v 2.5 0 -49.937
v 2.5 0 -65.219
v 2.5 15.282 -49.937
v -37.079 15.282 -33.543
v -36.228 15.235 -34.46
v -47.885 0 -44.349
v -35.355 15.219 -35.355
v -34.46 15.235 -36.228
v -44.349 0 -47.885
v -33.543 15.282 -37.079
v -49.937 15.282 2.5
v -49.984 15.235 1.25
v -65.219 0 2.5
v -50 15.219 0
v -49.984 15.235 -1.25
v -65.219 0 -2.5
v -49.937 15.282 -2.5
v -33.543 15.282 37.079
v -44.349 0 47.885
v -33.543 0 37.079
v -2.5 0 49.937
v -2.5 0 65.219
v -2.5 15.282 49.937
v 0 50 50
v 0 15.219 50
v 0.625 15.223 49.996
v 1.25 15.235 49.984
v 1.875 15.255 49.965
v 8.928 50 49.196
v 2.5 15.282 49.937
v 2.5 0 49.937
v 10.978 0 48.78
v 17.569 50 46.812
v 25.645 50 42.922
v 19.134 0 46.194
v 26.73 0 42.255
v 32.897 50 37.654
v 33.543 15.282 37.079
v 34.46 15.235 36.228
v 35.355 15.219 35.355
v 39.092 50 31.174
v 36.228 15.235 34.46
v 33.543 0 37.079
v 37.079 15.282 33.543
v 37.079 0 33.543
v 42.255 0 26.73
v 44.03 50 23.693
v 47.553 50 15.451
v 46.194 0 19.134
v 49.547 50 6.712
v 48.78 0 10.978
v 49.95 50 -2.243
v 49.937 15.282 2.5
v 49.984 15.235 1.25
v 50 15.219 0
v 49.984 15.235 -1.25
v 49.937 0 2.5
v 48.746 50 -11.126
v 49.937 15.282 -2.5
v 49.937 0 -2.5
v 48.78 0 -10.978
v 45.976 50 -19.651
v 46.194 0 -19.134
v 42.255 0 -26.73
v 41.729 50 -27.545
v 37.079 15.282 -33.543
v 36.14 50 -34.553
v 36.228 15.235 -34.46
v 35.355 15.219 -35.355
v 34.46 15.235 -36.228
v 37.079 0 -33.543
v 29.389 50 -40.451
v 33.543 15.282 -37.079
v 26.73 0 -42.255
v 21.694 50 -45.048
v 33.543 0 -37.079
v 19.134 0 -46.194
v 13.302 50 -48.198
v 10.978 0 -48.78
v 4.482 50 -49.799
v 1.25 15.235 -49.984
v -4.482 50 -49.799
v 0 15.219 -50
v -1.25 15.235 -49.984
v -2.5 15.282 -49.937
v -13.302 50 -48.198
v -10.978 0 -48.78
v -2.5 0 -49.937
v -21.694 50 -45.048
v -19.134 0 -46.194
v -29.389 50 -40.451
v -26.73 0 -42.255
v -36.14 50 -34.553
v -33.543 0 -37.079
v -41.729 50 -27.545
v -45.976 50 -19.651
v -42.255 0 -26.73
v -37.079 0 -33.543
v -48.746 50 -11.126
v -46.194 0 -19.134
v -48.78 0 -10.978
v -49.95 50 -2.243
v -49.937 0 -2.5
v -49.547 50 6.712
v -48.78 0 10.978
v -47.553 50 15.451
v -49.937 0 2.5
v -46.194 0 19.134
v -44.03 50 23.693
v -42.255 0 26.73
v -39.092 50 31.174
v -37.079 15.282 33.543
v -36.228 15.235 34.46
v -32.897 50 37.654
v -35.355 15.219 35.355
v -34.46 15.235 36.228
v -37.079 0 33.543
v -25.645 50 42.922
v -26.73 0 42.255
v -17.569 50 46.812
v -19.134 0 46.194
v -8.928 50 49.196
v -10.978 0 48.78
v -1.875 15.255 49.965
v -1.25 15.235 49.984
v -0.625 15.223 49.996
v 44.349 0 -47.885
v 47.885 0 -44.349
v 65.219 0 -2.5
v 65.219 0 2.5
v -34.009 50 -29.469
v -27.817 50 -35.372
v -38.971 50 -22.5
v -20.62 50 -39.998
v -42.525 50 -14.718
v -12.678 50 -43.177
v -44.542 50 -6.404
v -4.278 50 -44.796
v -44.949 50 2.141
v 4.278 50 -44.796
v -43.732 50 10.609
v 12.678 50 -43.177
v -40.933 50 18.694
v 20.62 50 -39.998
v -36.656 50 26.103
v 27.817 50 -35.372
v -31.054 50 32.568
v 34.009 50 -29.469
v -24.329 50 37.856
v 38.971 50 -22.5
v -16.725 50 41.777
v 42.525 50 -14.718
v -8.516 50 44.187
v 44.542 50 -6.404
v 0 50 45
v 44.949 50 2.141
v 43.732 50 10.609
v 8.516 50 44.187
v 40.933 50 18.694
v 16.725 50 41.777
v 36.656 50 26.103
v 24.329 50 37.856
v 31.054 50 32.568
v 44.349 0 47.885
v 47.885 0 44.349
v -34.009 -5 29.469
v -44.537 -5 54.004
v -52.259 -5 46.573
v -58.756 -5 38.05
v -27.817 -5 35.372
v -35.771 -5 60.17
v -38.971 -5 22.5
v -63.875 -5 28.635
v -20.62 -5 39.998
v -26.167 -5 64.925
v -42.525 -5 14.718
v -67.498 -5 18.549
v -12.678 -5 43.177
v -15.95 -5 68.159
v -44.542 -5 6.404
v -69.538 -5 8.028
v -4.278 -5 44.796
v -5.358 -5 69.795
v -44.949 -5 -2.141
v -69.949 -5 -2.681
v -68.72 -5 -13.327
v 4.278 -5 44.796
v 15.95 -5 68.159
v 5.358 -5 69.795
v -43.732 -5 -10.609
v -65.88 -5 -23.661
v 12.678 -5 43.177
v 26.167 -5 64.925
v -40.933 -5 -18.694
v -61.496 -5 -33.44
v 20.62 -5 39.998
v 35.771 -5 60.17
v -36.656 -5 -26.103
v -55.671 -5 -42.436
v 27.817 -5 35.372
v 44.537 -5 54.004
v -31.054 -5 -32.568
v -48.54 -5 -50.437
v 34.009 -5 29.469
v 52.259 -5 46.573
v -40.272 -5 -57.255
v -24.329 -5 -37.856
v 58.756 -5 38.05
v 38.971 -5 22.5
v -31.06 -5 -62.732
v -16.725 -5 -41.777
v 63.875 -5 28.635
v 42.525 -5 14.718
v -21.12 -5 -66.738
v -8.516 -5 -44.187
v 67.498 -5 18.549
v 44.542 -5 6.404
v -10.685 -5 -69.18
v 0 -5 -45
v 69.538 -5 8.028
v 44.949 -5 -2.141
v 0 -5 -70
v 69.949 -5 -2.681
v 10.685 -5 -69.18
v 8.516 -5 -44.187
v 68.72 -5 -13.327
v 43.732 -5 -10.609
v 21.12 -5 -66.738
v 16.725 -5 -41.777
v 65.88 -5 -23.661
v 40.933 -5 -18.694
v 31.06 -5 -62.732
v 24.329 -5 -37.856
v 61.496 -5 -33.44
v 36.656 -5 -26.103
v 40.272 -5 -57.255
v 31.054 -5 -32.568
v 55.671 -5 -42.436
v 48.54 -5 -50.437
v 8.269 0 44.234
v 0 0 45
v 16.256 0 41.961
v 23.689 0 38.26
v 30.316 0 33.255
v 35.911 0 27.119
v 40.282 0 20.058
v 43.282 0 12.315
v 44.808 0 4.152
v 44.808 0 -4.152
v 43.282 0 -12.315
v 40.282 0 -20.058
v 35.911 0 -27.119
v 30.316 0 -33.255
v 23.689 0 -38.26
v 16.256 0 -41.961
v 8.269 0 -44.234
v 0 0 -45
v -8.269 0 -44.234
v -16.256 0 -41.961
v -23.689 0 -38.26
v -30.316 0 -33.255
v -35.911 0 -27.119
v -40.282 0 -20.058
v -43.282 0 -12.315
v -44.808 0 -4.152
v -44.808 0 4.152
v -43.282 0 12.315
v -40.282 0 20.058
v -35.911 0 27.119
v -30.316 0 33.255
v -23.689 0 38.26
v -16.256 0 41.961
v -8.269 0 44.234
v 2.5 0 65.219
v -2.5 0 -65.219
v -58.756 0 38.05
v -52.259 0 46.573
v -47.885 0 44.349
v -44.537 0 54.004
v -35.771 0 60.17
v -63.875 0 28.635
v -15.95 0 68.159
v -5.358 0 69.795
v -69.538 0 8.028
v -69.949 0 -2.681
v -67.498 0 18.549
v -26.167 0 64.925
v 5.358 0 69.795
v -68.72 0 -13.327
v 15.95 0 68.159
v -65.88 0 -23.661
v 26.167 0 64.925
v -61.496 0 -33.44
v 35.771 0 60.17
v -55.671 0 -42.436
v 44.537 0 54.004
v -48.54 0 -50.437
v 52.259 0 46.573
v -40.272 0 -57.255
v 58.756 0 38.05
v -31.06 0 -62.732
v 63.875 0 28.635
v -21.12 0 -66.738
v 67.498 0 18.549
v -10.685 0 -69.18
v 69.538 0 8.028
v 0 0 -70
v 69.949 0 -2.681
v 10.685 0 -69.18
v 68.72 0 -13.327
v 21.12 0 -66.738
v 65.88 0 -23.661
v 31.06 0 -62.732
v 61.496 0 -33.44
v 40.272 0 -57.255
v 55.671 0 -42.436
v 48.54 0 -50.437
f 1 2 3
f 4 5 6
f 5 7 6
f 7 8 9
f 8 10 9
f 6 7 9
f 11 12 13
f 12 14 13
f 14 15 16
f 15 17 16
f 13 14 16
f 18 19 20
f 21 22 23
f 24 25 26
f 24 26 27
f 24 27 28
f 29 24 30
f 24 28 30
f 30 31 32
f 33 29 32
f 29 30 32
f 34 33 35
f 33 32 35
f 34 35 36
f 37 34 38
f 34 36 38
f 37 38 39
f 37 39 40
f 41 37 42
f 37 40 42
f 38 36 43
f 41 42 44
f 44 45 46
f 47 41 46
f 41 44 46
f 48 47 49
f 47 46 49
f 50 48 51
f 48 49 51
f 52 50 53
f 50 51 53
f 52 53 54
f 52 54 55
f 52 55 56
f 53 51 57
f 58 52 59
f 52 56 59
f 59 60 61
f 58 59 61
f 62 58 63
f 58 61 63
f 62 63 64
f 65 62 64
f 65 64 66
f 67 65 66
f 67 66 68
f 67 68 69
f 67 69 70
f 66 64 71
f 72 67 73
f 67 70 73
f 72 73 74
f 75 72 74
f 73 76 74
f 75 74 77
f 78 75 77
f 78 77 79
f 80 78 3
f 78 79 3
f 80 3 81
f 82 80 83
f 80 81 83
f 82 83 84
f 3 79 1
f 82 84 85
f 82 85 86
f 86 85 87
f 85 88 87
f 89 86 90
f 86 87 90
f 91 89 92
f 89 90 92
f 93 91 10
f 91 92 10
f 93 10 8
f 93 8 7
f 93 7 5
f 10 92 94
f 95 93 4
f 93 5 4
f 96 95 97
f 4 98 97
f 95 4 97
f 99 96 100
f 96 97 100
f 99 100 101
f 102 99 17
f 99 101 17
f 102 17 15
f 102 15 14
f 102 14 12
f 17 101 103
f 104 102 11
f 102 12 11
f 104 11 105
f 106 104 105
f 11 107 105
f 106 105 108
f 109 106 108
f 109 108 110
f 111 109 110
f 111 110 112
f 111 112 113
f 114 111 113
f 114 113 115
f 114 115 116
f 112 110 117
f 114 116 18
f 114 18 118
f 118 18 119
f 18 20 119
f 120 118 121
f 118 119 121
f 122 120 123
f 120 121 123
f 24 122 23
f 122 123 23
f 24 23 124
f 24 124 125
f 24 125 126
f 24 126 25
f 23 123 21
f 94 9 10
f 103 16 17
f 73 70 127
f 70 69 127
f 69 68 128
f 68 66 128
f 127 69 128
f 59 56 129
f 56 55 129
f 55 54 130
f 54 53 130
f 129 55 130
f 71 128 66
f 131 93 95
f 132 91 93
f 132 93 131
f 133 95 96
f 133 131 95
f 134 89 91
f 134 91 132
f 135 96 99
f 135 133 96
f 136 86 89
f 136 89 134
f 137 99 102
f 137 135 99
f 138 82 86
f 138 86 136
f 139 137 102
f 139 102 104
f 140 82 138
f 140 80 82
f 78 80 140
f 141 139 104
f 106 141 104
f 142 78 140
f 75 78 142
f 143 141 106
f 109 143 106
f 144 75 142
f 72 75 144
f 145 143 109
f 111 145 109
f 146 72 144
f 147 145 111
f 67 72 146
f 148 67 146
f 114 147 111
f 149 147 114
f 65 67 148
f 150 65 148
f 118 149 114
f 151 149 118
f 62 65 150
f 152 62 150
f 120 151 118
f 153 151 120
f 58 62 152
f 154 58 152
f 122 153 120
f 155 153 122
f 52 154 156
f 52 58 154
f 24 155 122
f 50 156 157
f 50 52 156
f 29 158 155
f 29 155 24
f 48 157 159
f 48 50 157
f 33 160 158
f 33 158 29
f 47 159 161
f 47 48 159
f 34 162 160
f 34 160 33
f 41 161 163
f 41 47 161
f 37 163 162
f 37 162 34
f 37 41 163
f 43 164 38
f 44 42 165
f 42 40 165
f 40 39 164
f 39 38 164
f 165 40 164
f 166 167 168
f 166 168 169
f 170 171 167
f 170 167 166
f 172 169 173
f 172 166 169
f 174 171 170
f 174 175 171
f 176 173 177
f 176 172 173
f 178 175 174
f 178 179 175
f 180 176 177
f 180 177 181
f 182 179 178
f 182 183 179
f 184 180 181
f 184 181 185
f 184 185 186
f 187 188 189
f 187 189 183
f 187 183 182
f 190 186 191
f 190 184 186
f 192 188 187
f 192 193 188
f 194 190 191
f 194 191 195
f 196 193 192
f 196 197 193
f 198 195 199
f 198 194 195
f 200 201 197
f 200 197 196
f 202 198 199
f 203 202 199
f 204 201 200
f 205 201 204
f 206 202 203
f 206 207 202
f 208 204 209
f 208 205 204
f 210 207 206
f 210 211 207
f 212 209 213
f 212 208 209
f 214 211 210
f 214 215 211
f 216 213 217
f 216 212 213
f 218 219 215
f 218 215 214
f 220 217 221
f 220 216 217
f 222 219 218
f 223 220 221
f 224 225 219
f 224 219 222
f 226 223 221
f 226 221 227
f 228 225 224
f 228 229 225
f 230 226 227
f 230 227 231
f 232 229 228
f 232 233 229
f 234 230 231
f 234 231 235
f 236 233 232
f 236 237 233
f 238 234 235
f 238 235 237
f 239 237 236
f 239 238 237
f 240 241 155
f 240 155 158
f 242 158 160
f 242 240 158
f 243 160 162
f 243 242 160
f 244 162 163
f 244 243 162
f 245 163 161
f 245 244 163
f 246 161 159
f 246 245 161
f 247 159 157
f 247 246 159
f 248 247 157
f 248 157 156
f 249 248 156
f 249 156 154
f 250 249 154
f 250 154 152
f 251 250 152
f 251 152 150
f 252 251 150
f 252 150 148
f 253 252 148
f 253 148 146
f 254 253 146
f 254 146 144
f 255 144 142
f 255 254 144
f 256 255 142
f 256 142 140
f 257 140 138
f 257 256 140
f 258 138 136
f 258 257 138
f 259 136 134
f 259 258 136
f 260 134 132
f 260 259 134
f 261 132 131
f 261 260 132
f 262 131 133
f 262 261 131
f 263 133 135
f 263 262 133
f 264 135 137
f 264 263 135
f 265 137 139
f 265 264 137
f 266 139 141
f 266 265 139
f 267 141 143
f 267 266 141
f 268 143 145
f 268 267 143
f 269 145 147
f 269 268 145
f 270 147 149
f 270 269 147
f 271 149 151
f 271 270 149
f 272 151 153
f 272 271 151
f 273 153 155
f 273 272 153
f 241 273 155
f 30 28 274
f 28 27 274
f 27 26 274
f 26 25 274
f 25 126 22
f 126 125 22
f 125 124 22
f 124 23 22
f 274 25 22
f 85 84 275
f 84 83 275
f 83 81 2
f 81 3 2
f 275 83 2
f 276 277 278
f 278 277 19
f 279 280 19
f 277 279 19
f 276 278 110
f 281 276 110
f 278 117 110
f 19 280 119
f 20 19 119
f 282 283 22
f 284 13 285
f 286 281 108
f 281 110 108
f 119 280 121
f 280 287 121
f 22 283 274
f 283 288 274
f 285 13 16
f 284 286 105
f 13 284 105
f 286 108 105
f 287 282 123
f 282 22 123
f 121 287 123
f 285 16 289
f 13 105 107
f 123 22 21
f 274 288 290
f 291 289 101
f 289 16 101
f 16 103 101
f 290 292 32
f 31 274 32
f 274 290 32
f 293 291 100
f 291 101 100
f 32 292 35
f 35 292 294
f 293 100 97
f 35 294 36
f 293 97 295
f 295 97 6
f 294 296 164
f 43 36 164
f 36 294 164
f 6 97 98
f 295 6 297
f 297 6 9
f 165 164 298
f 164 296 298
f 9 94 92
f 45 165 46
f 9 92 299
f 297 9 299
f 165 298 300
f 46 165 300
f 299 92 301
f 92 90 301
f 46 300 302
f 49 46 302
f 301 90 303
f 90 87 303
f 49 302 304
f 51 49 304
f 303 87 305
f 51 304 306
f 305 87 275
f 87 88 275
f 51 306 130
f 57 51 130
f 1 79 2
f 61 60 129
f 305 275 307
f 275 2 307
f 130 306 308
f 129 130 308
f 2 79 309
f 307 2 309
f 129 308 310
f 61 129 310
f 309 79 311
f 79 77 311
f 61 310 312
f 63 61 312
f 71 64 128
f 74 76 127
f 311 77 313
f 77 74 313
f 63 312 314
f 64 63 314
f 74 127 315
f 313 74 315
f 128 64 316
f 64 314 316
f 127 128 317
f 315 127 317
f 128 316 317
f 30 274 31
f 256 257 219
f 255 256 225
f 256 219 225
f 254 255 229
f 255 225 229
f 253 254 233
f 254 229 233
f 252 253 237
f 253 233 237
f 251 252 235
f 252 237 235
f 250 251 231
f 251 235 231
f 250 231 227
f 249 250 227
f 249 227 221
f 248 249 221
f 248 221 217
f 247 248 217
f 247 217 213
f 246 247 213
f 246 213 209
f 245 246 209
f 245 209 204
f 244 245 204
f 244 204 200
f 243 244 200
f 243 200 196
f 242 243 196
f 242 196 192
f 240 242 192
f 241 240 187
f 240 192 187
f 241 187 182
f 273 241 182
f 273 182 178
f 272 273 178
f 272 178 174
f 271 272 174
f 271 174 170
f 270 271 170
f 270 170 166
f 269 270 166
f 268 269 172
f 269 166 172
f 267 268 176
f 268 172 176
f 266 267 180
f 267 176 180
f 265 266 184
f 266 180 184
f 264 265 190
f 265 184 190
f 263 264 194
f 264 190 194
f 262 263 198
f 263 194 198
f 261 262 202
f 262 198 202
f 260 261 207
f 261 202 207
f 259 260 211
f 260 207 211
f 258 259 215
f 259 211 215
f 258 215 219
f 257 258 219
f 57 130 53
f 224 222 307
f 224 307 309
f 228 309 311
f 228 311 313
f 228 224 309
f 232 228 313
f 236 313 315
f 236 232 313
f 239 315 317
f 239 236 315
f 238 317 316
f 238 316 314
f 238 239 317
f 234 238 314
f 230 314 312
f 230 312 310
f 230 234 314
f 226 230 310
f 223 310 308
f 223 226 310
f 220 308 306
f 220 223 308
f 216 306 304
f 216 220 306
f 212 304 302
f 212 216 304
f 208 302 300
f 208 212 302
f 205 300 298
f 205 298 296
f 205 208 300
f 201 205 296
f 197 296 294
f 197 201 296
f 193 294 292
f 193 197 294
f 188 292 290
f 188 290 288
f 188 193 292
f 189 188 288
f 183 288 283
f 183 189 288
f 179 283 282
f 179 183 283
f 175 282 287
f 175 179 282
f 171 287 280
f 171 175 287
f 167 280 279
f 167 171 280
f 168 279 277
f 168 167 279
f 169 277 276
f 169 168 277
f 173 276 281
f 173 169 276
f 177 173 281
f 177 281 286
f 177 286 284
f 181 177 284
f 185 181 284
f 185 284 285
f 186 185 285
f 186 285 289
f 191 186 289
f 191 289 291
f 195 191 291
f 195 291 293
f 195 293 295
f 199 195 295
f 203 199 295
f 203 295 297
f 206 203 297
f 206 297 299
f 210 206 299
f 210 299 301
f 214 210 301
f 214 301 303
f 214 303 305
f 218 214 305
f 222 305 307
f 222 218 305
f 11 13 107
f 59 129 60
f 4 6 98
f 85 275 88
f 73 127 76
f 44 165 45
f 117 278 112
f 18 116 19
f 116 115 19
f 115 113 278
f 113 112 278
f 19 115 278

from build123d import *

# Parameters (mm, degrees)
SKETCH1_R           = 50
SKETCH1_R_2         = 45
BOSS_EXTRUDE1_DEPTH = 50
BOSS_EXTRUDE2_START = 5
SKETCH2_R           = 70
SKETCH2_R_2         = 45
BOSS_EXTRUDE2_DEPTH = 5
RIB1_REACH          = 112.905
SKETCH3_WALL_W      = 239.437922236
SKETCH3_WALL_H      = 5
CIRPATTERN1_COUNT   = 8


with BuildPart() as part:
    # Sketch1 → Boss-Extrude1 (new body)
    with BuildSketch(Plane(origin=(0, 0, 0), x_dir=(1, 0, 0), z_dir=(0, 1, 0))):
        Circle(SKETCH1_R)
        Circle(SKETCH1_R_2, mode=Mode.SUBTRACT)
    extrude(amount=BOSS_EXTRUDE1_DEPTH)

    # Sketch2 → Boss-Extrude2 (add)
    with BuildSketch(Plane.XZ.offset(BOSS_EXTRUDE2_START)):
        Circle(SKETCH2_R)
        Circle(SKETCH2_R_2, mode=Mode.SUBTRACT)
    extrude(amount=-BOSS_EXTRUDE2_DEPTH)

    # Sketch3 wall → Rib1 (add, up to next)
    with BuildSketch(Plane(origin=(0, 7.519718592, 57.699715082), x_dir=(0, -0.707106781187, 0.707106781187), z_dir=(0, -0.707106781187, -0.707106781187)), mode=Mode.PRIVATE) as rib1_sk1:
        Rectangle(SKETCH3_WALL_W, SKETCH3_WALL_H)
    rib1_tool1 = extrude(rib1_sk1.sketch, amount=RIB1_REACH, mode=Mode.PRIVATE) - part.part
    rib1 = rib1_tool1.solids().sort_by_distance((0, 7.519718592, 57.699715082))[0]
    add(rib1)

    # CirPattern1: Rib1 ×8 about axis
    cirpattern1_axis = Axis((0, -8.144073756, 0), (0, 1, 0))
    for i in range(1, CIRPATTERN1_COUNT):
        add(rib1.rotate(cirpattern1_axis, i * 360 / CIRPATTERN1_COUNT))


solid = part.part
